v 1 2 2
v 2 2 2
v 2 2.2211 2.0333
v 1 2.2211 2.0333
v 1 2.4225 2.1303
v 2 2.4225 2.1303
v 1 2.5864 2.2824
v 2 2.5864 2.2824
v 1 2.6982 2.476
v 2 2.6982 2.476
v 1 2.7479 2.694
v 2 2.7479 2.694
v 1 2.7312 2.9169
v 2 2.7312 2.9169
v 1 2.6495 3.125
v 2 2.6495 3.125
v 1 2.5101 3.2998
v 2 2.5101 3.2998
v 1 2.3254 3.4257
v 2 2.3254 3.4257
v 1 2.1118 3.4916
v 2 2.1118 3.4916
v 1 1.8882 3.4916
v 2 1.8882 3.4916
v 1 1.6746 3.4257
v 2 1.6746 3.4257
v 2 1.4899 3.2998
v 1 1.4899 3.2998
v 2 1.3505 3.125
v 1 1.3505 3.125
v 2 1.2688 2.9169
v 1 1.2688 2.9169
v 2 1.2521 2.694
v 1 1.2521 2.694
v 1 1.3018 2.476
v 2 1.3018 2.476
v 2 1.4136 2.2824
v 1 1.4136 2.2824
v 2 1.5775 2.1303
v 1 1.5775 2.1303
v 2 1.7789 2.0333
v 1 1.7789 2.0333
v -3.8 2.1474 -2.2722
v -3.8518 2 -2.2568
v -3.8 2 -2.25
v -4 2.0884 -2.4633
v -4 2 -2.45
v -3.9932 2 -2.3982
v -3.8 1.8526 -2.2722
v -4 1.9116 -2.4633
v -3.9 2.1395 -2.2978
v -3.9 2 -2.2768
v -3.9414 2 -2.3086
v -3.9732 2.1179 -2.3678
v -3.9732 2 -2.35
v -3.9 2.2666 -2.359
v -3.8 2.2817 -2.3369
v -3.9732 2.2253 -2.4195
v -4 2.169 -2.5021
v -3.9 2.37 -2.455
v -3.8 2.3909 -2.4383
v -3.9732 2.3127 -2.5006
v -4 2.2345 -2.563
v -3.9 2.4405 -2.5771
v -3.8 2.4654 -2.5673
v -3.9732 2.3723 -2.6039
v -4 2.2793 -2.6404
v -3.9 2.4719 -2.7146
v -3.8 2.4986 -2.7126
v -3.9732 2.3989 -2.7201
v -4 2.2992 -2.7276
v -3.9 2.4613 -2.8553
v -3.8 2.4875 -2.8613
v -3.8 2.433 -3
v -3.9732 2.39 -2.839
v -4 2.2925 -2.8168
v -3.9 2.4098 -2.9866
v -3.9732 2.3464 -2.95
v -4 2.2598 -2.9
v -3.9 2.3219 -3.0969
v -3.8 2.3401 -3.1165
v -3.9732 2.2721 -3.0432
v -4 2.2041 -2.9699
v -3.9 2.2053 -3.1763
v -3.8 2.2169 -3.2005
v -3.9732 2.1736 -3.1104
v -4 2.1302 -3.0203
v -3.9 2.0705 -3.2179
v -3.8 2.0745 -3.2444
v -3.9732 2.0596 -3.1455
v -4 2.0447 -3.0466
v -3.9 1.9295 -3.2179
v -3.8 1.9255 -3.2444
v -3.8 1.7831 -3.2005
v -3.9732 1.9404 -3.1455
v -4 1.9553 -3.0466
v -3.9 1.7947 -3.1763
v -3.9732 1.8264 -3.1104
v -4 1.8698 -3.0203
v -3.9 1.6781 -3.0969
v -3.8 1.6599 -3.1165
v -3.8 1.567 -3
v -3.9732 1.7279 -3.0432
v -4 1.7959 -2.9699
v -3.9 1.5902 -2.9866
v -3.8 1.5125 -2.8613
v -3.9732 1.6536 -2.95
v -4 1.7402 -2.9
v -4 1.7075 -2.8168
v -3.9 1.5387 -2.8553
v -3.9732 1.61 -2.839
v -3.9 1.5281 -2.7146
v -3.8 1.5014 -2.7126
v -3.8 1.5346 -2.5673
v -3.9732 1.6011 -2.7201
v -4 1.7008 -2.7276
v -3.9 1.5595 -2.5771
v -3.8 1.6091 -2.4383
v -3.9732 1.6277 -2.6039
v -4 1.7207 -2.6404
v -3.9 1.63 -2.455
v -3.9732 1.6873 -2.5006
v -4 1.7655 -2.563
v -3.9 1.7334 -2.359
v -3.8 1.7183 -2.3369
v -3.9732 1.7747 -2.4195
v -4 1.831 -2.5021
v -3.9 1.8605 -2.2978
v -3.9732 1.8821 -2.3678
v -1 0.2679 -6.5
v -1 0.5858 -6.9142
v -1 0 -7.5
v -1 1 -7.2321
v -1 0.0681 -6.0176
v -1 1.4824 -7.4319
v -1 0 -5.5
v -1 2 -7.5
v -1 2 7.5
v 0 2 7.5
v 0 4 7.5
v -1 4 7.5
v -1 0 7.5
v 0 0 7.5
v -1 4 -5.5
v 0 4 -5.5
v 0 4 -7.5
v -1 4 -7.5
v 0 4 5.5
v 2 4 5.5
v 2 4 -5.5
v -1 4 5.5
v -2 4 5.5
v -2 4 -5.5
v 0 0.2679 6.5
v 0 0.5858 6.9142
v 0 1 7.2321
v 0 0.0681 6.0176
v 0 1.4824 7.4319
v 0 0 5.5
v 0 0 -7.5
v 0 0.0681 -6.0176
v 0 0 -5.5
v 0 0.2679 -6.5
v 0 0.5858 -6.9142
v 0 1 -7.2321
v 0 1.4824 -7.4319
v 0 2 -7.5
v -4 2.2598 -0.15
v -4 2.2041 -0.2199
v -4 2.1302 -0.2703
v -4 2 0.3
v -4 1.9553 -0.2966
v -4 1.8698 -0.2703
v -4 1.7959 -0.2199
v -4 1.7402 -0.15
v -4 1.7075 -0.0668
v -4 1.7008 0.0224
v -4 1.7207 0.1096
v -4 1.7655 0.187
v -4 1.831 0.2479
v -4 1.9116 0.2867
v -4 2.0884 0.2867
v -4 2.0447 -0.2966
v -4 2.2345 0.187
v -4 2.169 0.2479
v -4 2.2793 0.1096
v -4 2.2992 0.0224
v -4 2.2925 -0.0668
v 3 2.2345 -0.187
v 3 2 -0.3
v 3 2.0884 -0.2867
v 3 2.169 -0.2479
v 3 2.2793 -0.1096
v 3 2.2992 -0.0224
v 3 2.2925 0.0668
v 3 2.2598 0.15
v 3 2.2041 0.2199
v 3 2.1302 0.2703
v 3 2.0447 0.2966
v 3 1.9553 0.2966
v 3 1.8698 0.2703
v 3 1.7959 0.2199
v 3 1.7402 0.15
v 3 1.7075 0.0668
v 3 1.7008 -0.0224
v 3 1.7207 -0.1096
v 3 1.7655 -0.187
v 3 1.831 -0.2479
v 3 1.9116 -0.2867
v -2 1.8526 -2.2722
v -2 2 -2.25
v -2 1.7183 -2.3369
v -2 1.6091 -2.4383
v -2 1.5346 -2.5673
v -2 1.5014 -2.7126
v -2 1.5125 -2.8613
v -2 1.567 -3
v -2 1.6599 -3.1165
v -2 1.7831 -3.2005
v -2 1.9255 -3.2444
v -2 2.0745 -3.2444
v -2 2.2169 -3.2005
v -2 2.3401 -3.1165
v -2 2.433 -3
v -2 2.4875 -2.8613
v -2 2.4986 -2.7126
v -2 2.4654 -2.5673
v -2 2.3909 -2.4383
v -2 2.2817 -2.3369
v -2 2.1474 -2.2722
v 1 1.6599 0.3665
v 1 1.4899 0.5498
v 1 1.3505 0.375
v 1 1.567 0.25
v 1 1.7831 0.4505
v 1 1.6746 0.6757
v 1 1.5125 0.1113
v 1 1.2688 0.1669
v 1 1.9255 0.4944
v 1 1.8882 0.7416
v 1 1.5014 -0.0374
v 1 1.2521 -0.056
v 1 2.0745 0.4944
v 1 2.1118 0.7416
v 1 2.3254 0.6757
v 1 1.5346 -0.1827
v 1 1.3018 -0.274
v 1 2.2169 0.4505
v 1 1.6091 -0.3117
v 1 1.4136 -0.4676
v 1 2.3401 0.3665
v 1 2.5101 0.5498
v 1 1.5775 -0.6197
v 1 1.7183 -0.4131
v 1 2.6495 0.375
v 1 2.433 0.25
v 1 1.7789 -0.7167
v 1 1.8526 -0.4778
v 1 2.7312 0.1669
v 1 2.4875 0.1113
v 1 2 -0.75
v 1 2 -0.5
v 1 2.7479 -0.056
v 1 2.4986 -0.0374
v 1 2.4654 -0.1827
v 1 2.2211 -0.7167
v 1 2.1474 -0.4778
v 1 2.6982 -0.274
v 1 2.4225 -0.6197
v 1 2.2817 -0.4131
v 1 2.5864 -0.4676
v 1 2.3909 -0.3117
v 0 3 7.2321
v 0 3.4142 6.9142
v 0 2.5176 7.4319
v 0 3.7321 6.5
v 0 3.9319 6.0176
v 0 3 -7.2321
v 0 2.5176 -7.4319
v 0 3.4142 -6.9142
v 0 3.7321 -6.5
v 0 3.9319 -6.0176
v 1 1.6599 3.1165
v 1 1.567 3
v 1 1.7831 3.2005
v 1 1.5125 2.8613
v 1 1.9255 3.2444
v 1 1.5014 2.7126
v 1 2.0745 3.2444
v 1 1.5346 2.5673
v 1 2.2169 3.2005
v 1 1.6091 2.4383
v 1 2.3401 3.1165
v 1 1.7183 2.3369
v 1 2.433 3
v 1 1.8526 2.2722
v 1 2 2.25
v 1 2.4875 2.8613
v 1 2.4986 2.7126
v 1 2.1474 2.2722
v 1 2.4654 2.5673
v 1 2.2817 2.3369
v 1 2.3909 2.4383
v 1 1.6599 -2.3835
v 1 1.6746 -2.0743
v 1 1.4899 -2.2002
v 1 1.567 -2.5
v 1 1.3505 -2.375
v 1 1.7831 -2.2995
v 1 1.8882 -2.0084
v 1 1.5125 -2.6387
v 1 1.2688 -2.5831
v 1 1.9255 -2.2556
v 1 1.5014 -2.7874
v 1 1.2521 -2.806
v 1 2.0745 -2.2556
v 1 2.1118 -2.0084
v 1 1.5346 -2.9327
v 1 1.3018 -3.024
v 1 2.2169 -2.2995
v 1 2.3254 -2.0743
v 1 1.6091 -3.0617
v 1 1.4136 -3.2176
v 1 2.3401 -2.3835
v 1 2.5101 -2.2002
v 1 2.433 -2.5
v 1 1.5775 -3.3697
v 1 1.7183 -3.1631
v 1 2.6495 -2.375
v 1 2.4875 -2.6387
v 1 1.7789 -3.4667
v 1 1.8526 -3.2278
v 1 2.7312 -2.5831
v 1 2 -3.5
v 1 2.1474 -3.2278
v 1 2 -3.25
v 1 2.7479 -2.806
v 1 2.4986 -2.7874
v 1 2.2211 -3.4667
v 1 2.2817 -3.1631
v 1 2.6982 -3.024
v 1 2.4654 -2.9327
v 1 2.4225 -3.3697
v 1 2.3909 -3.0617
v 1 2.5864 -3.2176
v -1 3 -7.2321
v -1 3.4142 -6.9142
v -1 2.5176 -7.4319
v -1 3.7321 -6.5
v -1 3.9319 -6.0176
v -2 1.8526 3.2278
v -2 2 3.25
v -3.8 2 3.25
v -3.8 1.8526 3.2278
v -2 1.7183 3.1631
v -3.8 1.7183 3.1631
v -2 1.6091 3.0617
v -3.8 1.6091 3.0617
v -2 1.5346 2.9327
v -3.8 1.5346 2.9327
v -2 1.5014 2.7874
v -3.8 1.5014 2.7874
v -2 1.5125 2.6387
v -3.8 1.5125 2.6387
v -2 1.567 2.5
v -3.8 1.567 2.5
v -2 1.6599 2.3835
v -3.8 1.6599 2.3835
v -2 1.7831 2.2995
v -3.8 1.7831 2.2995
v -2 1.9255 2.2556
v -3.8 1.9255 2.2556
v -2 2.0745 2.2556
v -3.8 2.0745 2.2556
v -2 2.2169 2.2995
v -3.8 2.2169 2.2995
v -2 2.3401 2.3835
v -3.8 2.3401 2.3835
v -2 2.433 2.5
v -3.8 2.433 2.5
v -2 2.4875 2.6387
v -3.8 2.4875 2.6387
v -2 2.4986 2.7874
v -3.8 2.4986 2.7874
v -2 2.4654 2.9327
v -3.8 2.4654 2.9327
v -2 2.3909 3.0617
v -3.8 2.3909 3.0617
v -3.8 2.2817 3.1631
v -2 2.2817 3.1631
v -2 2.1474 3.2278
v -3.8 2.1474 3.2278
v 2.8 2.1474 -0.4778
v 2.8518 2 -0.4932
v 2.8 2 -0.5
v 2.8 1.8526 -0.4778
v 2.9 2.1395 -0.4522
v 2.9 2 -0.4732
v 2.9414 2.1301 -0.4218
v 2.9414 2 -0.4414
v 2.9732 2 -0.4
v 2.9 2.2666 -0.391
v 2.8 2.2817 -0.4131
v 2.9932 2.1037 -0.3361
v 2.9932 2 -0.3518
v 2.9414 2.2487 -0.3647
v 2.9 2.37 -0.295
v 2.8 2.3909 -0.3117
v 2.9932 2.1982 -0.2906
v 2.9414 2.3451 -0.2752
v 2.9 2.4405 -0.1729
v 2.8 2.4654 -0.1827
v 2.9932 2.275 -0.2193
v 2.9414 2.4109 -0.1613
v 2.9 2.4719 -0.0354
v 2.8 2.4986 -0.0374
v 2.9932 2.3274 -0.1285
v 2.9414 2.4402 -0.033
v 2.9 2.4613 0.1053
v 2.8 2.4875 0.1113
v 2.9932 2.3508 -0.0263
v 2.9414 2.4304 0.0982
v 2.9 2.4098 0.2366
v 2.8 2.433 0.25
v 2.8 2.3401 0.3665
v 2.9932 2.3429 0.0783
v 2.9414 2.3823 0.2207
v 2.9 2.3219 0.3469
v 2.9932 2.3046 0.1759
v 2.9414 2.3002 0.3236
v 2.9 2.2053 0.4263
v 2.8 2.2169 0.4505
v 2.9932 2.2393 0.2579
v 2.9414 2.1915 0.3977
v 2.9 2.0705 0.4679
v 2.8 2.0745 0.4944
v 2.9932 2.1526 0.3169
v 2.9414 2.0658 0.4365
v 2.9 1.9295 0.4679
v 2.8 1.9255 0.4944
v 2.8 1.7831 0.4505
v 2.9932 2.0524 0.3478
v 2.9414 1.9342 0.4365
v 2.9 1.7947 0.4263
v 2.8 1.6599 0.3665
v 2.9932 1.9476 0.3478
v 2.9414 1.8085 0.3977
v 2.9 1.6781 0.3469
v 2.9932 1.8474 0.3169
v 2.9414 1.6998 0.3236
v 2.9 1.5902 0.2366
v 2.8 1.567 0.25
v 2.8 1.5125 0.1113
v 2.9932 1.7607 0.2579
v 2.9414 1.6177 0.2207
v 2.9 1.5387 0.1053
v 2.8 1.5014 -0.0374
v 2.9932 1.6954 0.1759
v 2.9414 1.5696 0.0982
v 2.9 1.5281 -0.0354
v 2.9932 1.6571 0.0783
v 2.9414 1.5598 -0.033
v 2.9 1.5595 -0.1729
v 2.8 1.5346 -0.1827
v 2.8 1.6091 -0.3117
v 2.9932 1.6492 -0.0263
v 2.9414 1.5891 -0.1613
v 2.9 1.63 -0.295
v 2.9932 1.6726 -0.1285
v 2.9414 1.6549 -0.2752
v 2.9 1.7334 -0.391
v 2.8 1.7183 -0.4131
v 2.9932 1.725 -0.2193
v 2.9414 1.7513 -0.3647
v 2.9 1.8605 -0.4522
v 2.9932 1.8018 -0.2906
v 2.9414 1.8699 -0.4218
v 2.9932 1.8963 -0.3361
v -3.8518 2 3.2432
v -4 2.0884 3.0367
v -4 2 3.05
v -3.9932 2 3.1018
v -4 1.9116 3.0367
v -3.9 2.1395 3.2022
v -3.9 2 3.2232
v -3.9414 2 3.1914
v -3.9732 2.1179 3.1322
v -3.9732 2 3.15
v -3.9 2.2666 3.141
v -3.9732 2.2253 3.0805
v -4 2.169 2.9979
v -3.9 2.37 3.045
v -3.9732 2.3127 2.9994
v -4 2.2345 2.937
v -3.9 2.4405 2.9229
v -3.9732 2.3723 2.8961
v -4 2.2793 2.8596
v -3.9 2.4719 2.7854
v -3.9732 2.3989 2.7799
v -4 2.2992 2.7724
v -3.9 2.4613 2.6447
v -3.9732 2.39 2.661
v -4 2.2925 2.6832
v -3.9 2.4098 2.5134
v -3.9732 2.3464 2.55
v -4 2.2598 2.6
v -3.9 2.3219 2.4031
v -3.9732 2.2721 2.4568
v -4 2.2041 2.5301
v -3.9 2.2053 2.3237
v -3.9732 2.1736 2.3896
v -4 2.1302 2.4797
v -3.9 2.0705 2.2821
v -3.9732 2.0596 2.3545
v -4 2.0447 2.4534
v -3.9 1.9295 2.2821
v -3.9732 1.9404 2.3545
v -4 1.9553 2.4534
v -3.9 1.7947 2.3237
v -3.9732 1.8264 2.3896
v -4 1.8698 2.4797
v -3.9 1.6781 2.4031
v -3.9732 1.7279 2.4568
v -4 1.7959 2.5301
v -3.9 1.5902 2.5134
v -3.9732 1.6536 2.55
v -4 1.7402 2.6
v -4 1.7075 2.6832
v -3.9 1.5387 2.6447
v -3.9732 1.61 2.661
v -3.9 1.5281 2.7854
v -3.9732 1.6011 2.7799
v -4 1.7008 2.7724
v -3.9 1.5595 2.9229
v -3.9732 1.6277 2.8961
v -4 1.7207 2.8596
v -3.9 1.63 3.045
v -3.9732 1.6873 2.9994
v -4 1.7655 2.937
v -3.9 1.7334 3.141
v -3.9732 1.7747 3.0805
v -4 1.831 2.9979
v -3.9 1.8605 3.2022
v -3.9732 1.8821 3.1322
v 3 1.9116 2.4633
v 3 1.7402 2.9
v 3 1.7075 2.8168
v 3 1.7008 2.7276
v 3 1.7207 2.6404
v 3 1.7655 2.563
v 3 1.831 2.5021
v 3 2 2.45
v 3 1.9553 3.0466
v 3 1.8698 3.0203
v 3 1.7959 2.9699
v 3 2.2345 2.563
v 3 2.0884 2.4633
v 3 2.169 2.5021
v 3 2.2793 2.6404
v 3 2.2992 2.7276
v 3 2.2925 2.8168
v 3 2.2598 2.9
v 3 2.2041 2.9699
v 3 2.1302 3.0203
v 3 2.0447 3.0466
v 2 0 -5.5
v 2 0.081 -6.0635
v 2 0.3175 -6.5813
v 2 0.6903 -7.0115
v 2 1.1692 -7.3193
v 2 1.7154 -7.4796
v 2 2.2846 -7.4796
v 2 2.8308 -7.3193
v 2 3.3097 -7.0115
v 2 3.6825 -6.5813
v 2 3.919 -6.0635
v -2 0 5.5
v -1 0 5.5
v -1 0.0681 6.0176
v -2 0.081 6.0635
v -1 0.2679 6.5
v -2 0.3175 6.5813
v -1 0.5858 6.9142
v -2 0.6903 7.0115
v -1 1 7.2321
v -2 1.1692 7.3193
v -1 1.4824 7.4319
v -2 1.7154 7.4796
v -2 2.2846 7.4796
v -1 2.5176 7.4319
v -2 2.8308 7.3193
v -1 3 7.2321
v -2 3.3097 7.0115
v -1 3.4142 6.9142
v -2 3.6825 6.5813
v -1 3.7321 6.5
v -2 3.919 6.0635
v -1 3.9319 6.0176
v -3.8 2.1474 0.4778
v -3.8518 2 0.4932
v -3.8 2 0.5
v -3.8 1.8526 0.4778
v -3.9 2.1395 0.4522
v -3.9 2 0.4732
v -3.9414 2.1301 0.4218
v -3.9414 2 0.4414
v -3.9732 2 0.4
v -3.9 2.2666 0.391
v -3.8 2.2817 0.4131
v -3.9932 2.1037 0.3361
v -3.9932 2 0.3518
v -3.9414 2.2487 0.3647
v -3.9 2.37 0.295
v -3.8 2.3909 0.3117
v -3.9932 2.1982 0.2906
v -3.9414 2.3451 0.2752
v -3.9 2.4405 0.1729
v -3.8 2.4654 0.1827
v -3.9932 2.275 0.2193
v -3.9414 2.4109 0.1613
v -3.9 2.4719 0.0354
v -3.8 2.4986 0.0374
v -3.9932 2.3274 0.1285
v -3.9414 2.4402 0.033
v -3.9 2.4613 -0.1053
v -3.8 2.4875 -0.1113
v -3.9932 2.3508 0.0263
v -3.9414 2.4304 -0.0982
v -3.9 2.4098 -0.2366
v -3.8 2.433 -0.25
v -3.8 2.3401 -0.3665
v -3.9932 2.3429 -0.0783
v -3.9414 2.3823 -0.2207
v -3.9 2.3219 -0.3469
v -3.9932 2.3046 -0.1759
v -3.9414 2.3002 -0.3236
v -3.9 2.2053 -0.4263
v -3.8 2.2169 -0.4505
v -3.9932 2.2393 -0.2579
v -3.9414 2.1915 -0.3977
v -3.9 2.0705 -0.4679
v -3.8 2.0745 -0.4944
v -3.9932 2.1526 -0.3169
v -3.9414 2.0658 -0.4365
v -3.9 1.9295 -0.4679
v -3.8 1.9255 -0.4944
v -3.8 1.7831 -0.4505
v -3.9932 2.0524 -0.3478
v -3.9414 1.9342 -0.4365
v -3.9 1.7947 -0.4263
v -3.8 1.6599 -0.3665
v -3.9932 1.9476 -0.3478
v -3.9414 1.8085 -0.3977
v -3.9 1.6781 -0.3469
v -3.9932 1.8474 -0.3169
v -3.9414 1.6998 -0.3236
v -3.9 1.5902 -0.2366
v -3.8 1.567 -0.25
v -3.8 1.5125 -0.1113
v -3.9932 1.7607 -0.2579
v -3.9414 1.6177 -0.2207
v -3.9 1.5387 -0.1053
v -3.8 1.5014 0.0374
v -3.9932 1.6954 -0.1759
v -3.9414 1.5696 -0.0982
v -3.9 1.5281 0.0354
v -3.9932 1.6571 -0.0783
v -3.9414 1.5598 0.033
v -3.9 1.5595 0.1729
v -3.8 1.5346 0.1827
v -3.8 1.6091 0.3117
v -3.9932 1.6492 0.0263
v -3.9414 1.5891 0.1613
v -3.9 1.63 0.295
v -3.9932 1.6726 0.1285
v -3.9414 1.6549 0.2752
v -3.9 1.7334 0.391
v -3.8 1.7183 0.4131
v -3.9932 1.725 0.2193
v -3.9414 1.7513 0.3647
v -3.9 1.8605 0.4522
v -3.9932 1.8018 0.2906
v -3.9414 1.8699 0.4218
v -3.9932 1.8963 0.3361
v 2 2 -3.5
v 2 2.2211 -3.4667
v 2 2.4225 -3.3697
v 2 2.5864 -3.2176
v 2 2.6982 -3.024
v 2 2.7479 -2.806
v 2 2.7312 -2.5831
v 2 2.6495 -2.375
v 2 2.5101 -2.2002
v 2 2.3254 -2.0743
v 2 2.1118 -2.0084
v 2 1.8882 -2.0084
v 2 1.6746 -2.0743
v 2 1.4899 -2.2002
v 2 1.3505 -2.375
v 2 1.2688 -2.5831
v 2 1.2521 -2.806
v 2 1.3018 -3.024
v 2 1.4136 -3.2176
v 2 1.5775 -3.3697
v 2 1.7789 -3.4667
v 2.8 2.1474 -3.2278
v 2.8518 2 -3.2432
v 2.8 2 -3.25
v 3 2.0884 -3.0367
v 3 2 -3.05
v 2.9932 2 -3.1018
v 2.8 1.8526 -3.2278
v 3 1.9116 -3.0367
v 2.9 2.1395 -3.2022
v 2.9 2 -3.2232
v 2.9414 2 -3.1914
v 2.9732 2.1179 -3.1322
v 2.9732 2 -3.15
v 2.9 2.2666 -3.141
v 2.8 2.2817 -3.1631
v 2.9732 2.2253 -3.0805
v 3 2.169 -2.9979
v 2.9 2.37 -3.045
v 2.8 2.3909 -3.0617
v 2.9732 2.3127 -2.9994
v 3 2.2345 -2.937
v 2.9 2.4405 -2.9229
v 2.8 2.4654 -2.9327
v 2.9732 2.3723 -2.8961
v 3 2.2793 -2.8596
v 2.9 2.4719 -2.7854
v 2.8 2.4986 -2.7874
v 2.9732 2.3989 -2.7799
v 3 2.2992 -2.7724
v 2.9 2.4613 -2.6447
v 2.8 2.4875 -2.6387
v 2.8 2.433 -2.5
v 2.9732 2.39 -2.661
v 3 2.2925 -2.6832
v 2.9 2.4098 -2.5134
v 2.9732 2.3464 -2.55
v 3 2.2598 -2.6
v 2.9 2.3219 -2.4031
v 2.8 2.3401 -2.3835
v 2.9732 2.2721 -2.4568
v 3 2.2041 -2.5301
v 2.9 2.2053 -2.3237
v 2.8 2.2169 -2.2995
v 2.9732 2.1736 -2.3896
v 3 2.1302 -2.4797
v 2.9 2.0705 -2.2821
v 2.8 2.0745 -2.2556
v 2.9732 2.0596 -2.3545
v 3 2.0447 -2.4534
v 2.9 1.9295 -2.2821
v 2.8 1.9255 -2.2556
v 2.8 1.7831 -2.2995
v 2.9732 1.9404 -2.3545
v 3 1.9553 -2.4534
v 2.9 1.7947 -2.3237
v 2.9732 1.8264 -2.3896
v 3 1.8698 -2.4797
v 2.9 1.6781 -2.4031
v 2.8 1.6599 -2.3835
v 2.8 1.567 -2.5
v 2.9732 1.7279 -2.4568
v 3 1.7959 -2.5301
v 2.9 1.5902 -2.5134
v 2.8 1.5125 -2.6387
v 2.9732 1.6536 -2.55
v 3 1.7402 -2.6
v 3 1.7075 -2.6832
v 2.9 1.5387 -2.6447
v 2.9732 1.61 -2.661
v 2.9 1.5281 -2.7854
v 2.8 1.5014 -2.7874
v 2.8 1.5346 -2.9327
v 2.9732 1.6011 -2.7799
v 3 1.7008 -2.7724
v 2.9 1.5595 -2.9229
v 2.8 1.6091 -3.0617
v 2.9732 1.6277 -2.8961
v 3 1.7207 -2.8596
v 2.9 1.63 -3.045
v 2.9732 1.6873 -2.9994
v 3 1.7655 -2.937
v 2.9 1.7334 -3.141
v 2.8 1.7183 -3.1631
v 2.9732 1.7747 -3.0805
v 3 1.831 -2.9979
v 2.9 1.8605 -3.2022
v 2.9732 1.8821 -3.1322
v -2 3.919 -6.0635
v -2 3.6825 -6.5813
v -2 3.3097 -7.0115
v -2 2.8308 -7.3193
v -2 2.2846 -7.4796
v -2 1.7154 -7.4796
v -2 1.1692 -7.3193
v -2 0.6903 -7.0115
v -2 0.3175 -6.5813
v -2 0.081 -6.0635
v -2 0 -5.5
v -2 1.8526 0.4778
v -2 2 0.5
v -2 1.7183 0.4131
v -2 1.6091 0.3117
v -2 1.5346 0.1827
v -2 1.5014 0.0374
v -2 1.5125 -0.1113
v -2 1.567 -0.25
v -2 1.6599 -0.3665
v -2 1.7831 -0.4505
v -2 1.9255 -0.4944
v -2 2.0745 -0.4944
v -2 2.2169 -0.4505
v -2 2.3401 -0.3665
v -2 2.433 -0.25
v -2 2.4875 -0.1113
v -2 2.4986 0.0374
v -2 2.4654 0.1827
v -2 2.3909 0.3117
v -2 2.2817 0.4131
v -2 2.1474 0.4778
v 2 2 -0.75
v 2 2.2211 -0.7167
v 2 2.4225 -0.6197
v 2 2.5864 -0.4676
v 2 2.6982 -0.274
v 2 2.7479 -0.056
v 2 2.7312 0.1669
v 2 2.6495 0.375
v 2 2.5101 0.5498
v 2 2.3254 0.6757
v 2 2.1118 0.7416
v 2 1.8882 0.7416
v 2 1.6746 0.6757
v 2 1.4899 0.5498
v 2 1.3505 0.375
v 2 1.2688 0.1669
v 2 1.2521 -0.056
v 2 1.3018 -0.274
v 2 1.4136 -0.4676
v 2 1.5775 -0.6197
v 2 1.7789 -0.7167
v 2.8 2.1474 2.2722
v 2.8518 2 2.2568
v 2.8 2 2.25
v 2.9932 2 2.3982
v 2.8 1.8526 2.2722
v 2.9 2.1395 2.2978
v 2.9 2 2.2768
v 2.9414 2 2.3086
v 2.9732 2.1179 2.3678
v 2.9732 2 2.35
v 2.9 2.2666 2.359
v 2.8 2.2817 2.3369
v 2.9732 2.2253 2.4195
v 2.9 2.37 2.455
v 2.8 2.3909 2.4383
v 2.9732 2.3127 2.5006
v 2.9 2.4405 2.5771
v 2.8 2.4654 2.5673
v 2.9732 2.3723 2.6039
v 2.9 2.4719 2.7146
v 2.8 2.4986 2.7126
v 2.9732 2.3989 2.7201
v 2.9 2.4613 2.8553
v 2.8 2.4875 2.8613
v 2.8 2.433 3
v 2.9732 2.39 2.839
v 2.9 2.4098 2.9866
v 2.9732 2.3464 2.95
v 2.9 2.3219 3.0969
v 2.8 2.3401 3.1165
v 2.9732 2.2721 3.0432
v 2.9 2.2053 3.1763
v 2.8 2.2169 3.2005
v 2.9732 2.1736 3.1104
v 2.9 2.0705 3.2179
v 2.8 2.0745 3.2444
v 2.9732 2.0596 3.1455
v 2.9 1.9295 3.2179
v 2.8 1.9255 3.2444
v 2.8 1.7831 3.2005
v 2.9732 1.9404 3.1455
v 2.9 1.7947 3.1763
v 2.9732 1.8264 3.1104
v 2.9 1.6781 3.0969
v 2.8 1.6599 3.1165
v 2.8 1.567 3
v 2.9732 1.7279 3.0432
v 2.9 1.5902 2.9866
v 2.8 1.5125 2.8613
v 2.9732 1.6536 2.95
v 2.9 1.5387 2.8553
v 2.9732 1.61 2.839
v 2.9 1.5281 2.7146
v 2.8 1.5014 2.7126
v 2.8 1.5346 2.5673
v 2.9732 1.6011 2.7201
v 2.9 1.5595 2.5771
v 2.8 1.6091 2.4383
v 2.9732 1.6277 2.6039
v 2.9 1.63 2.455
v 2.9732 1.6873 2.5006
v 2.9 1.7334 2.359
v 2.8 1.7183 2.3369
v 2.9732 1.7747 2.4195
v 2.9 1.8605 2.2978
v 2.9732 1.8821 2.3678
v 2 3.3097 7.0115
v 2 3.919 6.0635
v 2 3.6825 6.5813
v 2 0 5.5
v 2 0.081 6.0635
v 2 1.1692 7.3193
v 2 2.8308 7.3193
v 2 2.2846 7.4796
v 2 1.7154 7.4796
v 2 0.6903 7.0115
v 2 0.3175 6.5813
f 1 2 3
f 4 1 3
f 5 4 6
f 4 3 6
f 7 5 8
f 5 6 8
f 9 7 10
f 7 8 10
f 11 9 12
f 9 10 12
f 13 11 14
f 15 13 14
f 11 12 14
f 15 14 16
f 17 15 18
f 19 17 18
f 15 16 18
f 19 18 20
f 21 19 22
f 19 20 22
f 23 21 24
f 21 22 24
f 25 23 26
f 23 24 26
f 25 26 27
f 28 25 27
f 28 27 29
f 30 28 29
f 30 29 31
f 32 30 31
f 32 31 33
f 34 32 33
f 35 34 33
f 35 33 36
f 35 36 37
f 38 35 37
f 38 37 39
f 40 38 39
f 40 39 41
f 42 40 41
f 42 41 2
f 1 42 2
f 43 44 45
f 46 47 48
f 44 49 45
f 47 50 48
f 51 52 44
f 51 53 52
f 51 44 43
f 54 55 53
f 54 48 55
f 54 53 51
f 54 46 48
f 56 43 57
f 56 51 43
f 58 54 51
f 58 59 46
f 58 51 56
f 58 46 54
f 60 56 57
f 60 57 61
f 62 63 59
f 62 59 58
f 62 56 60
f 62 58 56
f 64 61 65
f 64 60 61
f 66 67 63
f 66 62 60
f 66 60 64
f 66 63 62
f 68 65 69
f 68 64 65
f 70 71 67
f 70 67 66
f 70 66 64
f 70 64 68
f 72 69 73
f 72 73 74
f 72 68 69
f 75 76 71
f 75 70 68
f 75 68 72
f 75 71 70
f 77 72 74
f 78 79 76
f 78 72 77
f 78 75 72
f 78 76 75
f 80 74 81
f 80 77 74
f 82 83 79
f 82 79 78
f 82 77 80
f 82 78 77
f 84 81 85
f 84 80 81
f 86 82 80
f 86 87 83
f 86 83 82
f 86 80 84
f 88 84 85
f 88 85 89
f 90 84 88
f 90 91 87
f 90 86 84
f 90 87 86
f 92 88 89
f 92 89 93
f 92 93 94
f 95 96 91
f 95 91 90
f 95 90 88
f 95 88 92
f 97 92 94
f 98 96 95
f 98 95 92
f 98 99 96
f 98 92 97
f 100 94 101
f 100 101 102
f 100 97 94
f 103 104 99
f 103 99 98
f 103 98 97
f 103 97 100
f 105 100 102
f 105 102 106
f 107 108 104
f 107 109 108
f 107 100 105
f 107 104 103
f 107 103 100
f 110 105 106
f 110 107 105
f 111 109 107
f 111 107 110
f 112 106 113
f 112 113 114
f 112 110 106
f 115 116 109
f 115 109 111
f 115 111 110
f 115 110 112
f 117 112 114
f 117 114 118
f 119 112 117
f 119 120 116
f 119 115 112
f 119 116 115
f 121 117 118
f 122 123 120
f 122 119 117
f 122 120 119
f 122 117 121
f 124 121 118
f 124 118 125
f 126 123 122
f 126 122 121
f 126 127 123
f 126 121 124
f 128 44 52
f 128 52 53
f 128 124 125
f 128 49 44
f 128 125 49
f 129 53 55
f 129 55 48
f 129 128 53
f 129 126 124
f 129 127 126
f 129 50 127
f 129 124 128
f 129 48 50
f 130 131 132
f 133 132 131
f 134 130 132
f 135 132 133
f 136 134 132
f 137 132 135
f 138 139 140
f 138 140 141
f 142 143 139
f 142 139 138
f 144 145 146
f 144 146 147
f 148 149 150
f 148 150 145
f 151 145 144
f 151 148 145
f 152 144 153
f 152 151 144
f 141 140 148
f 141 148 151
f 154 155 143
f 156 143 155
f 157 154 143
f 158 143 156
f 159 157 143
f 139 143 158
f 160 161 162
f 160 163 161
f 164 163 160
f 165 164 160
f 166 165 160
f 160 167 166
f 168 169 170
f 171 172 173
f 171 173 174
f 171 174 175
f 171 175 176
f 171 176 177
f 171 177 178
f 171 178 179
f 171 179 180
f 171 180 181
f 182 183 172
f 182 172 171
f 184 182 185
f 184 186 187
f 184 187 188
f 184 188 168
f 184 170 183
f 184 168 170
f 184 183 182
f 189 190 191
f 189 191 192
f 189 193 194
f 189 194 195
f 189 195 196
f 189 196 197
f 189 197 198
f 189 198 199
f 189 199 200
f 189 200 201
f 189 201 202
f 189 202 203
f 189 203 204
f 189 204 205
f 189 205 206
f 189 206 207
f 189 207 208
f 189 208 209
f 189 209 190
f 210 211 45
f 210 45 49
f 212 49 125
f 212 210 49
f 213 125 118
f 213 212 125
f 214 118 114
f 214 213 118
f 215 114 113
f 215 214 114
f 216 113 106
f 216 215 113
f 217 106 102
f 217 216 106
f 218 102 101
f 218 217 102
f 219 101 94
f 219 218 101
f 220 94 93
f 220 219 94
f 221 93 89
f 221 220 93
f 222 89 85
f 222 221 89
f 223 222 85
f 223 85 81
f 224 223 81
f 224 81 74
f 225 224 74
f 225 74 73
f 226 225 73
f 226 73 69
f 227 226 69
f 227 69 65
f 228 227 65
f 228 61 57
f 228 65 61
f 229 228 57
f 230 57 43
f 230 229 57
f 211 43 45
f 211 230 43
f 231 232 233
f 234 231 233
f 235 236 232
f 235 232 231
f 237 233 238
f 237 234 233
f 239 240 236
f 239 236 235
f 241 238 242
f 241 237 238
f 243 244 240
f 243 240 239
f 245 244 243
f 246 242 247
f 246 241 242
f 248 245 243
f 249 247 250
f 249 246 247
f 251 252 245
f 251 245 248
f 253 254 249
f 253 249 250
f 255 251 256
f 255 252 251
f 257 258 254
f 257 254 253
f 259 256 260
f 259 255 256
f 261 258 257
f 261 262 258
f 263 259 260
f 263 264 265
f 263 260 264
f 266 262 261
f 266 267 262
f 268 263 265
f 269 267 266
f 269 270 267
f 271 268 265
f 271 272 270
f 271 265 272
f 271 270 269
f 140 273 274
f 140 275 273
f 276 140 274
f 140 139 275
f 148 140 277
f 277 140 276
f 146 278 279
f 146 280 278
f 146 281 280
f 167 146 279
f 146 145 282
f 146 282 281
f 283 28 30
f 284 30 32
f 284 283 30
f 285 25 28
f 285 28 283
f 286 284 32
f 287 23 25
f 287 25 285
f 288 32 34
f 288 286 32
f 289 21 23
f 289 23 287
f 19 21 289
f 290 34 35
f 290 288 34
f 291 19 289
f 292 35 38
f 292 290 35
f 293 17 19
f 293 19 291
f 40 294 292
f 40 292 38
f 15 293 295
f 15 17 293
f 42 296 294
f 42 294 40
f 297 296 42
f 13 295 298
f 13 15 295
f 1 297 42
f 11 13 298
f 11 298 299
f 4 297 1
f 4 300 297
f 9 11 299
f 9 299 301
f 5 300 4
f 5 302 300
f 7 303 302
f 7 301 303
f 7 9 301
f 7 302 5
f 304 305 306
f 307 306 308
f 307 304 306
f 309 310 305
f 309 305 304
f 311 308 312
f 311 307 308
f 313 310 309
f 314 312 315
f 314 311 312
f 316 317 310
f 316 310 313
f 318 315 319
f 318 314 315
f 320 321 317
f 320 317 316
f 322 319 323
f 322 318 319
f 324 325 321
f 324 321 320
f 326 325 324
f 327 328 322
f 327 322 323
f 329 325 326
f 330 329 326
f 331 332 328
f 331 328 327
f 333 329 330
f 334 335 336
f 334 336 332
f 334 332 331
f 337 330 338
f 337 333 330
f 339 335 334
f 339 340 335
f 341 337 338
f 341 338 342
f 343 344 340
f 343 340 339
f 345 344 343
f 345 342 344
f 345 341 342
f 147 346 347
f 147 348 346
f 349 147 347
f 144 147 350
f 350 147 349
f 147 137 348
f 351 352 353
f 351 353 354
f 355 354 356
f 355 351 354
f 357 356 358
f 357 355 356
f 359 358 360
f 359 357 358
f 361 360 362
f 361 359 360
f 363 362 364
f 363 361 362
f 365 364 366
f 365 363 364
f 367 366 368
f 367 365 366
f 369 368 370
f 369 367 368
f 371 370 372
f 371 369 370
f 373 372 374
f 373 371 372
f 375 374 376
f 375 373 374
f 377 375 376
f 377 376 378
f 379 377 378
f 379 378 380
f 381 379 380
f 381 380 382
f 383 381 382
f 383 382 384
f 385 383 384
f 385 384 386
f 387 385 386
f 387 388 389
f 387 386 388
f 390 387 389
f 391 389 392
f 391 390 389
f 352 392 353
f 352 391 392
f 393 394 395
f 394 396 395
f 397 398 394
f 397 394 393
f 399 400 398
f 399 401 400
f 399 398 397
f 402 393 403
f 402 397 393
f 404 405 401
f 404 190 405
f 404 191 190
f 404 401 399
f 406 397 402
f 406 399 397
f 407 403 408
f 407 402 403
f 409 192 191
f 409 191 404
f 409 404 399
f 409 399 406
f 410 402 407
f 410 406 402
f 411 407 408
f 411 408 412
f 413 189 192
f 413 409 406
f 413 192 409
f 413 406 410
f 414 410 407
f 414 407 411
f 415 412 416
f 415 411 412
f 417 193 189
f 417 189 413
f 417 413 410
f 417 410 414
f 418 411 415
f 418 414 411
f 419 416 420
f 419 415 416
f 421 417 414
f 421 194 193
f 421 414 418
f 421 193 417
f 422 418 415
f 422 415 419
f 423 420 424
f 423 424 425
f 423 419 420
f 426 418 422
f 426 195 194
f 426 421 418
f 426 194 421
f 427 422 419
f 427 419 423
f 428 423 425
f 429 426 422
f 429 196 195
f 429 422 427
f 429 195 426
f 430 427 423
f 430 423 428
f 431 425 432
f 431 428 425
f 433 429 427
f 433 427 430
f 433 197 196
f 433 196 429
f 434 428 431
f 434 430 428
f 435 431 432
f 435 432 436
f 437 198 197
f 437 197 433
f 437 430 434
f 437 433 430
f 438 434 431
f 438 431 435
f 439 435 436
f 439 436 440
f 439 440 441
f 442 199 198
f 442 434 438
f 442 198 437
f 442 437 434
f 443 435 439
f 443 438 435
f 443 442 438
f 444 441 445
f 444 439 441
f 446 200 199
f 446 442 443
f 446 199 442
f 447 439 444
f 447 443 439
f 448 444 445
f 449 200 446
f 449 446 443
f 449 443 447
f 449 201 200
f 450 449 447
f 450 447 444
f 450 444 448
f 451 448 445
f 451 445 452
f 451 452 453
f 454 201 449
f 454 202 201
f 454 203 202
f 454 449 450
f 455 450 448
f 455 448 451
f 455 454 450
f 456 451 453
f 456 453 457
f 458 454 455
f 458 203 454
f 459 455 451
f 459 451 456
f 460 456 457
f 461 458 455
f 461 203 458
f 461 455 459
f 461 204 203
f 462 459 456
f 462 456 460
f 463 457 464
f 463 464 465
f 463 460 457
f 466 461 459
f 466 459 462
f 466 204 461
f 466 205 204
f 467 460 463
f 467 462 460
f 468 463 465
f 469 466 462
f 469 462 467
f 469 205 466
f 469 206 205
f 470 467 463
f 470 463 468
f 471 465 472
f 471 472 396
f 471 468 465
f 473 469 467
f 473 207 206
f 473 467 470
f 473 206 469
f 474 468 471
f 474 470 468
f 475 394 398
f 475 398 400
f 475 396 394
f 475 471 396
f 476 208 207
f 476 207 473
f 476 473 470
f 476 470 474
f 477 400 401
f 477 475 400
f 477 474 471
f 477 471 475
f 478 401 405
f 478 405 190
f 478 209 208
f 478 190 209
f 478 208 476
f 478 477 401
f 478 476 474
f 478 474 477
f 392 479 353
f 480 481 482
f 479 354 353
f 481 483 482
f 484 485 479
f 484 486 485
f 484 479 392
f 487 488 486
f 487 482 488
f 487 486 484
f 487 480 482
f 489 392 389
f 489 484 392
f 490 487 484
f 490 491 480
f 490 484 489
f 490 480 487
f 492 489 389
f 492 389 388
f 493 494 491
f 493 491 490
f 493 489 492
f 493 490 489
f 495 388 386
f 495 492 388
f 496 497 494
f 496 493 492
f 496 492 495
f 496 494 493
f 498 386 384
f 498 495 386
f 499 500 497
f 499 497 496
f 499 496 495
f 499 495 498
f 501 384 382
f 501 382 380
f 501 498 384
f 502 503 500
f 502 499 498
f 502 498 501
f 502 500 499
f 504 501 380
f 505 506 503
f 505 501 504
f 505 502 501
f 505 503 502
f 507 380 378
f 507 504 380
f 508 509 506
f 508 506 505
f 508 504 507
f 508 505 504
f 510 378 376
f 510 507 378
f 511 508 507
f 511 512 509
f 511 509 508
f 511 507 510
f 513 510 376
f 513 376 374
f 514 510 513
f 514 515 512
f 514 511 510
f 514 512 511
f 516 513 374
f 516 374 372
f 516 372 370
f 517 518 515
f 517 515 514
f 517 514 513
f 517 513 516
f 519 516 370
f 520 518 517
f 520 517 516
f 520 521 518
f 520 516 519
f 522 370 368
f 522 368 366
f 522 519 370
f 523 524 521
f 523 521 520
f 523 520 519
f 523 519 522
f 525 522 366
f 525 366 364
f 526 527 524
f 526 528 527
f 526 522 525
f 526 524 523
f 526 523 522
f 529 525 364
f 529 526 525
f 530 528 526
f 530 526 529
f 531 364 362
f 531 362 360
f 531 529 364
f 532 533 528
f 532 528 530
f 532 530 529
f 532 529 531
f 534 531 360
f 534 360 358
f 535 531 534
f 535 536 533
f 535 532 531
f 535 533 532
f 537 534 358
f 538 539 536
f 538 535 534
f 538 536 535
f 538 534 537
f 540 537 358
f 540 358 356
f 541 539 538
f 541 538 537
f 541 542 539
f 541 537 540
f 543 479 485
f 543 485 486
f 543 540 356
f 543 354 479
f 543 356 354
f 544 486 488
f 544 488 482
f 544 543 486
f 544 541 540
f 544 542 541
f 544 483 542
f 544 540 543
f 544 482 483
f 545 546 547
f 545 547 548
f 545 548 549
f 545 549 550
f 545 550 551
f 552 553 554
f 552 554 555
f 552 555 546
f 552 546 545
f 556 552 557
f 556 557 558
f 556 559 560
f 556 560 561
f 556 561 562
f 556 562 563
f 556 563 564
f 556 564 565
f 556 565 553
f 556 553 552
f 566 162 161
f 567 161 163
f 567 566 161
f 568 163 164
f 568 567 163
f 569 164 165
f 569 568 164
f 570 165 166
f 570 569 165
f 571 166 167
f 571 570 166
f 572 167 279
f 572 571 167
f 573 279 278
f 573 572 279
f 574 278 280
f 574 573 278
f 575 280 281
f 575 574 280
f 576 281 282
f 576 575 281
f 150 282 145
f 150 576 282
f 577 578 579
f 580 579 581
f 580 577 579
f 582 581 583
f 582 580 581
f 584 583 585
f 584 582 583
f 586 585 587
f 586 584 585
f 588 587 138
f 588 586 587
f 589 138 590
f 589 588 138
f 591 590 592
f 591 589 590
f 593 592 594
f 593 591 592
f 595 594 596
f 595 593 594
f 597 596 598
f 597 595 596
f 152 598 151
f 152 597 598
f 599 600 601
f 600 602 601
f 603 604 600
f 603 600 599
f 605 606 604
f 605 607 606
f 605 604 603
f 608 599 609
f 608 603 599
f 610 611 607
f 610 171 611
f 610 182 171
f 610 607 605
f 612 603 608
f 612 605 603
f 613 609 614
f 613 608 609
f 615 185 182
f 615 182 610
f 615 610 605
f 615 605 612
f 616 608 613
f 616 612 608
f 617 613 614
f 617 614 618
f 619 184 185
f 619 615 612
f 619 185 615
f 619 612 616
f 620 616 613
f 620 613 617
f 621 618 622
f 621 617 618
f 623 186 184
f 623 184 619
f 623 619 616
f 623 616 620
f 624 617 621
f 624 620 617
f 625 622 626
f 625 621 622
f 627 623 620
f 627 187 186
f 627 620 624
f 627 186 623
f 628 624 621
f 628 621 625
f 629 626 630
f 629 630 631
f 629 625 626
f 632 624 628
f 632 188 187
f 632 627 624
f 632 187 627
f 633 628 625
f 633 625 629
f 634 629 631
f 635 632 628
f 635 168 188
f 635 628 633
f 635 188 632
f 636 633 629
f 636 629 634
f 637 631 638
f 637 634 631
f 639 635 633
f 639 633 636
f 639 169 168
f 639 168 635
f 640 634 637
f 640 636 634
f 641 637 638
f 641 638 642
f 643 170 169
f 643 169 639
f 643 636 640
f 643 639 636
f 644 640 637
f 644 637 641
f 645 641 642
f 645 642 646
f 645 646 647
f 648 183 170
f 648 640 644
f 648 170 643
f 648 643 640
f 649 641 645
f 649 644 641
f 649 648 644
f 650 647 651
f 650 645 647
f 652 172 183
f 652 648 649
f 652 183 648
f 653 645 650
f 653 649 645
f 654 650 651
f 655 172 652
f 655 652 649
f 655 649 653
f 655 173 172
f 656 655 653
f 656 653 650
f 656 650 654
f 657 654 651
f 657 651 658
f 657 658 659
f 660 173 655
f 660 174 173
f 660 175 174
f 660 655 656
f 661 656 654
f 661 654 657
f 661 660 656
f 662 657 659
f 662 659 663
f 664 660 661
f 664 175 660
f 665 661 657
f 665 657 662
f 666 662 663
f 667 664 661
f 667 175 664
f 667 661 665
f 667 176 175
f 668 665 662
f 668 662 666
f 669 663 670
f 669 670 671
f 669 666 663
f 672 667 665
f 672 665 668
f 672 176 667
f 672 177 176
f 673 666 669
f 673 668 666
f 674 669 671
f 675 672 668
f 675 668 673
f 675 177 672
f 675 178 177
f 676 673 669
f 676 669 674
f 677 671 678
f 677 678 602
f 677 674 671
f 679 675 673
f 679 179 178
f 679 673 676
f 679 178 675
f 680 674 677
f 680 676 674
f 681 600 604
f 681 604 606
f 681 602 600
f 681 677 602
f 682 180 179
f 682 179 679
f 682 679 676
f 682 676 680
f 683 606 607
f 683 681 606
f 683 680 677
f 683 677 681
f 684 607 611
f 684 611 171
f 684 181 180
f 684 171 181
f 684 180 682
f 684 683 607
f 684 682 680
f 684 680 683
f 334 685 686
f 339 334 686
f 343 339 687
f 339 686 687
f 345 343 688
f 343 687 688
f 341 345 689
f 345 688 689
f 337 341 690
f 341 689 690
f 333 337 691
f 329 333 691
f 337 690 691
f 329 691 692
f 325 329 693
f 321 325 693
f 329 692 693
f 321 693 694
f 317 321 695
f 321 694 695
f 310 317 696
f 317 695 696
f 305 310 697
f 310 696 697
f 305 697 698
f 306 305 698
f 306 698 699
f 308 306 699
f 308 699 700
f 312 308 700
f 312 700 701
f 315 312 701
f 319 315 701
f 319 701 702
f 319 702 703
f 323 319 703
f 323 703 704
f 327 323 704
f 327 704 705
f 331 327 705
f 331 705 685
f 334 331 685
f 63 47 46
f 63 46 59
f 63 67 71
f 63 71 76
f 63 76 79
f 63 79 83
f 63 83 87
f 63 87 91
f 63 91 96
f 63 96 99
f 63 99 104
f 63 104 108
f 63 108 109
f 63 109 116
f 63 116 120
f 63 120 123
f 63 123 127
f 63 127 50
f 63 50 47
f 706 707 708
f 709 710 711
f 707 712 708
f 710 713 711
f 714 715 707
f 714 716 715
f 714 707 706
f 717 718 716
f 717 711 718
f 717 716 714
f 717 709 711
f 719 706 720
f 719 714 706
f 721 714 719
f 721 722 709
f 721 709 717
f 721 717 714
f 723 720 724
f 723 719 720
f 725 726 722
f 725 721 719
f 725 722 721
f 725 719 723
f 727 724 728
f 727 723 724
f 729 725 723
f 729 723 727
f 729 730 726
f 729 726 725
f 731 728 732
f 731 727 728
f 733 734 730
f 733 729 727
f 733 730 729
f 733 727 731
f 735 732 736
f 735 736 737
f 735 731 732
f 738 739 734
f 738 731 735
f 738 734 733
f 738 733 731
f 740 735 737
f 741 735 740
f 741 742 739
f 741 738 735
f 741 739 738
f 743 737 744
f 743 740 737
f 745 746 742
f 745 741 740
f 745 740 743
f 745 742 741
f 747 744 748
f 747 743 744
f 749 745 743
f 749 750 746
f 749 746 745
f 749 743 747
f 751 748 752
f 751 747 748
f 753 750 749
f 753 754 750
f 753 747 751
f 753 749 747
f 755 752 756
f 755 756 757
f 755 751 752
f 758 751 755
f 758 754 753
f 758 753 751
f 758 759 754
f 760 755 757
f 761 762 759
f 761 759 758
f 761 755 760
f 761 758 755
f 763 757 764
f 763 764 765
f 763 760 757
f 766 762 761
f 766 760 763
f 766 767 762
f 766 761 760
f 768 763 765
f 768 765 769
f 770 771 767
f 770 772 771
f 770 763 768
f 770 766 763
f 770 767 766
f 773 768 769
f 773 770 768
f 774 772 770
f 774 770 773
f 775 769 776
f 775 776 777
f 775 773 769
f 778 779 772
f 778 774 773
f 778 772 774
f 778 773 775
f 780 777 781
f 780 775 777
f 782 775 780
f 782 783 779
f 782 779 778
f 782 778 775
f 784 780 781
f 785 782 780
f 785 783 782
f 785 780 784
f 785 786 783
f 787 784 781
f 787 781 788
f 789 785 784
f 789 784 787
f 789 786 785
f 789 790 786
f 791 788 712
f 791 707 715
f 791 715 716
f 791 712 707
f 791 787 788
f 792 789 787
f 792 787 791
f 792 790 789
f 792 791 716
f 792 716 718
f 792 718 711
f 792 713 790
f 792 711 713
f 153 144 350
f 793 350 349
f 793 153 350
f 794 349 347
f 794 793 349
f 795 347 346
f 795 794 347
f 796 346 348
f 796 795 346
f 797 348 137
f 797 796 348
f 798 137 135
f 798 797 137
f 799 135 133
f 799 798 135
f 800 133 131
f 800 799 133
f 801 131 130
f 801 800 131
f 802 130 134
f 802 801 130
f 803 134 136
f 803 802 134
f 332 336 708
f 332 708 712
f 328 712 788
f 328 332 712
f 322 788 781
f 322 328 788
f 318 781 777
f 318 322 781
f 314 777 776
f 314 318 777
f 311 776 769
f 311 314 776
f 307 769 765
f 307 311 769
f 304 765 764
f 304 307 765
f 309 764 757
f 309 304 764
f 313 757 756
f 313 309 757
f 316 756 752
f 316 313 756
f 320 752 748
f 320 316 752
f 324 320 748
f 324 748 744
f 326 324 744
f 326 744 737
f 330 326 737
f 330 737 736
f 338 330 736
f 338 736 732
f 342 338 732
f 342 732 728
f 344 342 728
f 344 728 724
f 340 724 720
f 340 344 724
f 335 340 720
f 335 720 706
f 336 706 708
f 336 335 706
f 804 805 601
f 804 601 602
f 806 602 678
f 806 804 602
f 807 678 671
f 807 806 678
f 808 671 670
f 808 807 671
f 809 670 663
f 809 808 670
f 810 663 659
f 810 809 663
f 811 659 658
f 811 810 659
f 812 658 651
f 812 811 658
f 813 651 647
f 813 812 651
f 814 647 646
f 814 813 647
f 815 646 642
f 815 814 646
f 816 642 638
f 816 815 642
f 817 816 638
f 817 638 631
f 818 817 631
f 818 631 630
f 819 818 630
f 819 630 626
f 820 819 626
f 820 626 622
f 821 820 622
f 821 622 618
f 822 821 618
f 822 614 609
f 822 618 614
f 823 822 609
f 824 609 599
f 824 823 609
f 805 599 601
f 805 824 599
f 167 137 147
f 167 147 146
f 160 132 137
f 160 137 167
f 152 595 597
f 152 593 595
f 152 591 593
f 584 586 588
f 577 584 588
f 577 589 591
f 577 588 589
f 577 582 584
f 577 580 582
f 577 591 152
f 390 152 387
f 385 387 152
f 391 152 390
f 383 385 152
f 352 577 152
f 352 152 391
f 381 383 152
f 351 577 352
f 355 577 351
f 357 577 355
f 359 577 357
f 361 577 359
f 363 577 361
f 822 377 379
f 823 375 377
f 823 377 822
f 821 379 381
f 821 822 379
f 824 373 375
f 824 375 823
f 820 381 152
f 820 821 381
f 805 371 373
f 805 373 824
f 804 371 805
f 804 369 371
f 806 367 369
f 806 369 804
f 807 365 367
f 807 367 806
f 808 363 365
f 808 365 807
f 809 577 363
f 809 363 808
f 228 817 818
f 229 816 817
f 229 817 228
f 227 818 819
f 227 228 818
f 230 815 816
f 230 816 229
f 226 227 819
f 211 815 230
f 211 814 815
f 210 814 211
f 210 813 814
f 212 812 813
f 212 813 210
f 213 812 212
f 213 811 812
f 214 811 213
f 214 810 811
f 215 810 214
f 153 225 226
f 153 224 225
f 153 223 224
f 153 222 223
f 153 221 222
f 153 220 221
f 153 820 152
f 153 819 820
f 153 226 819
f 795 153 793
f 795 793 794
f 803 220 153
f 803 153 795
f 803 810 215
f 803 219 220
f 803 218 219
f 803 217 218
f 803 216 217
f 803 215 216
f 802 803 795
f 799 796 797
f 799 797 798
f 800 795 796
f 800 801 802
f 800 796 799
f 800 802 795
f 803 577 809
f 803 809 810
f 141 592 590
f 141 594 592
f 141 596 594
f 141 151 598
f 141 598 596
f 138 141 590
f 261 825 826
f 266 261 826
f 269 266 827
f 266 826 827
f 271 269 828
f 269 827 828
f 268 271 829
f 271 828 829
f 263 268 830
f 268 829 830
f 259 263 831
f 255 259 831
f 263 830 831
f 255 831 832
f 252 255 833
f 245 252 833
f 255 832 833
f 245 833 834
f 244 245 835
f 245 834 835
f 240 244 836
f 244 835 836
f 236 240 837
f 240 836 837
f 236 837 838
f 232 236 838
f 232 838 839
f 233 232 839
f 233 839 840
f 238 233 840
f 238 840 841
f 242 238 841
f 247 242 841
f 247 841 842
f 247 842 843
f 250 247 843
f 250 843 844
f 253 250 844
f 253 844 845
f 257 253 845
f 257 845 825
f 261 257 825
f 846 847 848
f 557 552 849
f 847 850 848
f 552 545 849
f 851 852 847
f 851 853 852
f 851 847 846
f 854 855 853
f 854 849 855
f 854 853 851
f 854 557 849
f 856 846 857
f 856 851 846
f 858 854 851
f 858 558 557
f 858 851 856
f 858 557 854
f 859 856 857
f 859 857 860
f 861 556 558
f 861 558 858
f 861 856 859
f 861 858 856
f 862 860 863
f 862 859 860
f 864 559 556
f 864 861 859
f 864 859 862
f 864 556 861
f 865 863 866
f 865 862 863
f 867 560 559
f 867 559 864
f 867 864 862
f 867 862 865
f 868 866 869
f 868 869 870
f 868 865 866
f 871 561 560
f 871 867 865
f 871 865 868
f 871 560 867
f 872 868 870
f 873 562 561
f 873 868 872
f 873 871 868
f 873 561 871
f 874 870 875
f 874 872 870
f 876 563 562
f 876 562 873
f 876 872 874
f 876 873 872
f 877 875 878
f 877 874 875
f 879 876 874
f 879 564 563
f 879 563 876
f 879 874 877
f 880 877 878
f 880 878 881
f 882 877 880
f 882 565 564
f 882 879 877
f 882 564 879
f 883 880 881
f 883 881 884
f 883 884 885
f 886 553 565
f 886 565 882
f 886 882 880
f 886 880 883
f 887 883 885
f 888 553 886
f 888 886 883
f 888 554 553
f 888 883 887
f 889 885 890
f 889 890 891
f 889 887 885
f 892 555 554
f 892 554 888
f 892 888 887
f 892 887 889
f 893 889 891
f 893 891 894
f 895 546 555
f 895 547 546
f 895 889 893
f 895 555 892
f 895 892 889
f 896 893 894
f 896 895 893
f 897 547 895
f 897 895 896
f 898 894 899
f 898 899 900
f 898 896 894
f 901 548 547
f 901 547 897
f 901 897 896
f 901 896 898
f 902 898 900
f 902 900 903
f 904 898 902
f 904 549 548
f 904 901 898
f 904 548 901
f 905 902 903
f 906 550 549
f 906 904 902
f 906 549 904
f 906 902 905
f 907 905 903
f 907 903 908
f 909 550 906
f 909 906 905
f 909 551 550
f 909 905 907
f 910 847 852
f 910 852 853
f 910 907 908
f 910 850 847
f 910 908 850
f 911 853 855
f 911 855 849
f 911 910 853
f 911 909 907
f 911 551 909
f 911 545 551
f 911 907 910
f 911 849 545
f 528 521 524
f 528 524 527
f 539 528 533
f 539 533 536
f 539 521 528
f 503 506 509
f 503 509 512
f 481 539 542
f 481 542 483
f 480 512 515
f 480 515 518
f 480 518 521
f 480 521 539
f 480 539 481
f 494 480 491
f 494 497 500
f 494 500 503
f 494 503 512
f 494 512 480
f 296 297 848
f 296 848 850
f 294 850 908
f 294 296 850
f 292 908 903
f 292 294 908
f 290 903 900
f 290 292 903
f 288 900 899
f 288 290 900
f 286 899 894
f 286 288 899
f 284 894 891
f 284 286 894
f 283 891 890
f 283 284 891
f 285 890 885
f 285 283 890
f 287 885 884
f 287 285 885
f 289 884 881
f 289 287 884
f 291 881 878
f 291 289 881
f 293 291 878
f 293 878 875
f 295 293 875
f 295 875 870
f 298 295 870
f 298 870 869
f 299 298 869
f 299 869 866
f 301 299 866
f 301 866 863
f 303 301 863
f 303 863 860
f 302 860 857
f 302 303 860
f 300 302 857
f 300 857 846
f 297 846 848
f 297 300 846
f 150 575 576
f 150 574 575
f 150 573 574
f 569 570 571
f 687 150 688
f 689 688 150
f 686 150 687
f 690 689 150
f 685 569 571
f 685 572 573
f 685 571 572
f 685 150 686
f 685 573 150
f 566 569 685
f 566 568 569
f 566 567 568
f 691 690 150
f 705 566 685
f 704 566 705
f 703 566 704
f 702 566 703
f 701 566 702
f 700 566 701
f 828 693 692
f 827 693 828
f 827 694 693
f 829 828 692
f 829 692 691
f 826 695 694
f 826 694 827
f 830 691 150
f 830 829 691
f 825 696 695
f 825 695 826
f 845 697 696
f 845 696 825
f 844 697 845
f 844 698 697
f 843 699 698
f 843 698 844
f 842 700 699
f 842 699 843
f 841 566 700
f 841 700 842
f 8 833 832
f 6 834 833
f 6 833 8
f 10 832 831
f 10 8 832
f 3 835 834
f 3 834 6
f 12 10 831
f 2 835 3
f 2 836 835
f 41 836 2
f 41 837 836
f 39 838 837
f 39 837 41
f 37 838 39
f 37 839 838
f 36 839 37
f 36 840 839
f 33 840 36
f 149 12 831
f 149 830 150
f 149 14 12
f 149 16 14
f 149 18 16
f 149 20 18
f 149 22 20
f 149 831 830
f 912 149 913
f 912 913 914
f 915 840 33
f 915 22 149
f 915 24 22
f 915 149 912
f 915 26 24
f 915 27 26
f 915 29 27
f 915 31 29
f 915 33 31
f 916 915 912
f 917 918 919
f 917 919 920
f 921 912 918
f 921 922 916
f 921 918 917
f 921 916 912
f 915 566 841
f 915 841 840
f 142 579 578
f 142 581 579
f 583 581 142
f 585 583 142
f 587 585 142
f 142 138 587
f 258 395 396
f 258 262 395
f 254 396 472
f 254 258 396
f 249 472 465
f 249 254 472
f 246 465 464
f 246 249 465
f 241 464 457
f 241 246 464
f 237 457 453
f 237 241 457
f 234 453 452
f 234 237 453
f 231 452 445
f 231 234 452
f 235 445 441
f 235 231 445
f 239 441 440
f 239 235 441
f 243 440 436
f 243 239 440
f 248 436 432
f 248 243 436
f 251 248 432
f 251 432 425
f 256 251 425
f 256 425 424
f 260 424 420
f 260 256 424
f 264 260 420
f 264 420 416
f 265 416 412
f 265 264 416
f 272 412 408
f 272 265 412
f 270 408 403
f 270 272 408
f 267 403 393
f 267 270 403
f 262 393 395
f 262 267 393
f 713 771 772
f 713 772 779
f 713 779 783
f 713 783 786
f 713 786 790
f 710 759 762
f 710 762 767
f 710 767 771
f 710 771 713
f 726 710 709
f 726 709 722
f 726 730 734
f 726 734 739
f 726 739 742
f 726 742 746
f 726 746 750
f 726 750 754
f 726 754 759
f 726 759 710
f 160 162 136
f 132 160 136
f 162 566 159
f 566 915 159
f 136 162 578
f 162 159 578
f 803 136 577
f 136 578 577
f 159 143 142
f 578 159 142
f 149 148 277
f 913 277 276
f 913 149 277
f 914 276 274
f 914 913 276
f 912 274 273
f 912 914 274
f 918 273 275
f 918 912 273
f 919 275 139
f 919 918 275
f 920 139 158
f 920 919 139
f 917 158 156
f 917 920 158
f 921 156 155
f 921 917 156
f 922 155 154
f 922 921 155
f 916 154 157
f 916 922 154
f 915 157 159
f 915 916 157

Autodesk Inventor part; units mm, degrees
ref_plane "YZ Plane" through (0, 0, 0) normal (1, 0, 0) x (0, 1, 0)
ref_plane "XZ Plane" through (0, 0, 0) normal (0, 1, 0) x (-1, 0, 0)
ref_plane "XY Plane" through (0, 0, 0) normal (0, 0, 1) x (1, 0, 0)
sketch "Sketch1" plane through (0, 0, 0) normal (0, 1, 0) x (-1, 0, 0)
  line L0 (-2, 7.5) -> (2, 7.5)
  line L1 (2, 7.5) -> (2, -7.5)
  line L2 (2, -7.5) -> (-2, -7.5)
  line L3 (-2, -7.5) -> (-2, 7.5)
  line L4 (-2, 7.5) -> (2, -7.5) construction
  line L5 (2, 7.5) -> (-2, -7.5) construction
  point P0 (0, 0)
  dimension "d0" = 4
  dimension "d1" = 15
extrude "Extrusion1" add sketch "Sketch1" along normal blind 4
sketch "Sketch2" plane through (2, 0, 7.5) normal (1, 0, 0) x (0, 0, -1)
  line L0 (0, 0) -> (0, 4) projected
  line L1 (0, 2) -> (15, 2) construction
  line L2 (15, 0) -> (15, 4) projected
  line L3 (2, 0) -> (13, 0)
  line L4 (13, 4) -> (2, 4)
  arc A0 (2, 4) -> (2, 0) centre (2, 2) ccw
  arc A1 (13, 0) -> (13, 4) centre (13, 2) ccw
  line L5 (0, 4) -> (15, 4) projected
  line L6 (0, 0) -> (15, 0) projected
  point P0 (7.5, 0)
  point P1 (7.5, 2)
  point P2 (15, 2)
extrude "Extrusion2" cut sketch "Sketch2" against normal blind 2 contours L0 A0 L6 | L0 L5 A0 | A1 L2 L6 | L5 L2 A1
sketch "Sketch3" plane through (-2, 0, -7.5) normal (-1, 0, 0) x (0, 0, 1)
  arc A0 (2, 4) -> (0, 2) centre (2, 2) ccw projected
  line L0 (0, 0) -> (0, 4) projected
  line L1 (0, 4) -> (15, 4) projected
  arc A1 (0, 2) -> (2, 0) centre (2, 2) ccw projected
  arc A2 (2, 4) -> (2, 0) centre (2, 2) ccw projected
  line L2 (13, 4) -> (2, 4) projected
  arc A3 (13, 0) -> (13, 4) centre (13, 2) ccw projected
  line L3 (13, 0) -> (2, 0) projected
  line L4 (15, 0) -> (15, 4) projected
  line L5 (0, 0) -> (15, 0) projected
  point P0 (7.5, 0)
  point P1 (15, 2)
extrude "Extrusion3" cut sketch "Sketch3" against normal blind 1 contours A0 L0 L1 | A1 L5 L0 | L1 L4 A3 | L4 L5 A3
sketch "Sketch4" plane through (-2, 0, -5.5) normal (-1, 0, 0) x (0, 0, 1)
  arc A0 (0, 4) -> (-2, 2) centre (0, 2) ccw projected
  circle A1 centre (0, 2) radius 1.5
  arc A2 (13, 2) -> (11, 4) centre (11, 2) ccw projected
  circle A3 centre (11, 2) radius 1.5
  point P0 (5.5, 0)
  dimension "d8" = 3
  dimension "d9" = 3
mark "Mark1"
sketch "Sketch5" plane through (-2, 0, -5.5) normal (-1, 0, 0) x (0, 0, 1)
  circle A0 centre (2.75, 2) radius 1
  circle A1 centre (0, 2) radius 1.5 projected
  circle A2 centre (11, 2) radius 1.5 projected
  line L0 (0, 4) -> (11, 4) projected
  circle A3 centre (5.5, 2) radius 1
  circle A4 centre (8.25, 2) radius 1
  point P0 (5.5, 0)
  dimension "d10" = 2
  dimension "d11" = 2.75
  dimension "d12" = 11
  dimension "d15" = 2.75
mark "Mark2"
sketch "Sketch6" plane through (-2, 2, -2.75) normal (-1, 0, 0) x (0, 0, 1)
  circle A0 centre (0, 0) radius 1 projected
  circle A1 centre (0, 0) radius 0.5
  circle A2 centre (2.75, 0) radius 1 projected
  circle A3 centre (2.75, 0) radius 0.5
  circle A4 centre (5.5, 0) radius 1 projected
  circle A5 centre (5.5, 0) radius 0.5
  point P0 (2.75, -2)
  dimension "d20" = 1
  dimension "d21" = 1
  dimension "d31" = 1
extrude "Extrusion4" add sketch "Sketch6" along normal blind 2 contours A1 | A3 | A5
sketch "Sketch7" plane through (2, 0, 5.5) normal (1, 0, 0) x (0, 0, -1)
  circle A0 centre (0, 2) radius 1.5 projected
  circle A1 centre (11, 2) radius 1.5 projected
  point P0 (5.5, 0)
mark "Mark3"
sketch "Sketch8" plane through (2, 0, 5.5) normal (1, 0, 0) x (0, 0, -1)
  circle A0 centre (8.25, 2) radius 1 projected
  circle A1 centre (5.5, 2) radius 1 projected
  circle A2 centre (5.5, 2) radius 0.75
  circle A3 centre (8.25, 2) radius 0.75
  circle A4 centre (2.75, 2) radius 1 projected
  circle A5 centre (2.75, 2) radius 0.75
  point P0 (5.5, 0)
  dimension "d24" = 1.5
  dimension "d25" = 1.5
  dimension "d32" = 1.5
extrude "Extrusion5" cut sketch "Sketch8" against normal blind 1 contours A2 | A3 | A5
sketch "Sketch9" plane through (1, 2, 0) normal (1, 0, 0) x (0, 0, -1)
  circle A0 centre (2.75, 0) radius 0.5 projected
  circle A1 centre (0, 0) radius 0.5 projected
  circle A2 centre (-2.75, 0) radius 0.5 projected
  point P0 (0, -2)
extrude "Extrusion6" add sketch "Sketch9" along normal blind 2
fillet "Fillet1" radius 0.2 6 edges at (3, 2, 0.5) (3, 2, -2.25) (-4, 2, -3.25) (-4, 2, -0.5) (3, 2, 3.25) (-4, 2, 2.25)
equation "\"d9\" = d8"
equation "\"d11\" = 0.25 * d12"
equation "\"d15\" = d11"
equation "\"d21\" = d20"
equation "\"d31\" = d21"
equation "\"d25\" = d24"
equation "\"d32\" = d24"
properties part number "3_pin_no_ear_male"
